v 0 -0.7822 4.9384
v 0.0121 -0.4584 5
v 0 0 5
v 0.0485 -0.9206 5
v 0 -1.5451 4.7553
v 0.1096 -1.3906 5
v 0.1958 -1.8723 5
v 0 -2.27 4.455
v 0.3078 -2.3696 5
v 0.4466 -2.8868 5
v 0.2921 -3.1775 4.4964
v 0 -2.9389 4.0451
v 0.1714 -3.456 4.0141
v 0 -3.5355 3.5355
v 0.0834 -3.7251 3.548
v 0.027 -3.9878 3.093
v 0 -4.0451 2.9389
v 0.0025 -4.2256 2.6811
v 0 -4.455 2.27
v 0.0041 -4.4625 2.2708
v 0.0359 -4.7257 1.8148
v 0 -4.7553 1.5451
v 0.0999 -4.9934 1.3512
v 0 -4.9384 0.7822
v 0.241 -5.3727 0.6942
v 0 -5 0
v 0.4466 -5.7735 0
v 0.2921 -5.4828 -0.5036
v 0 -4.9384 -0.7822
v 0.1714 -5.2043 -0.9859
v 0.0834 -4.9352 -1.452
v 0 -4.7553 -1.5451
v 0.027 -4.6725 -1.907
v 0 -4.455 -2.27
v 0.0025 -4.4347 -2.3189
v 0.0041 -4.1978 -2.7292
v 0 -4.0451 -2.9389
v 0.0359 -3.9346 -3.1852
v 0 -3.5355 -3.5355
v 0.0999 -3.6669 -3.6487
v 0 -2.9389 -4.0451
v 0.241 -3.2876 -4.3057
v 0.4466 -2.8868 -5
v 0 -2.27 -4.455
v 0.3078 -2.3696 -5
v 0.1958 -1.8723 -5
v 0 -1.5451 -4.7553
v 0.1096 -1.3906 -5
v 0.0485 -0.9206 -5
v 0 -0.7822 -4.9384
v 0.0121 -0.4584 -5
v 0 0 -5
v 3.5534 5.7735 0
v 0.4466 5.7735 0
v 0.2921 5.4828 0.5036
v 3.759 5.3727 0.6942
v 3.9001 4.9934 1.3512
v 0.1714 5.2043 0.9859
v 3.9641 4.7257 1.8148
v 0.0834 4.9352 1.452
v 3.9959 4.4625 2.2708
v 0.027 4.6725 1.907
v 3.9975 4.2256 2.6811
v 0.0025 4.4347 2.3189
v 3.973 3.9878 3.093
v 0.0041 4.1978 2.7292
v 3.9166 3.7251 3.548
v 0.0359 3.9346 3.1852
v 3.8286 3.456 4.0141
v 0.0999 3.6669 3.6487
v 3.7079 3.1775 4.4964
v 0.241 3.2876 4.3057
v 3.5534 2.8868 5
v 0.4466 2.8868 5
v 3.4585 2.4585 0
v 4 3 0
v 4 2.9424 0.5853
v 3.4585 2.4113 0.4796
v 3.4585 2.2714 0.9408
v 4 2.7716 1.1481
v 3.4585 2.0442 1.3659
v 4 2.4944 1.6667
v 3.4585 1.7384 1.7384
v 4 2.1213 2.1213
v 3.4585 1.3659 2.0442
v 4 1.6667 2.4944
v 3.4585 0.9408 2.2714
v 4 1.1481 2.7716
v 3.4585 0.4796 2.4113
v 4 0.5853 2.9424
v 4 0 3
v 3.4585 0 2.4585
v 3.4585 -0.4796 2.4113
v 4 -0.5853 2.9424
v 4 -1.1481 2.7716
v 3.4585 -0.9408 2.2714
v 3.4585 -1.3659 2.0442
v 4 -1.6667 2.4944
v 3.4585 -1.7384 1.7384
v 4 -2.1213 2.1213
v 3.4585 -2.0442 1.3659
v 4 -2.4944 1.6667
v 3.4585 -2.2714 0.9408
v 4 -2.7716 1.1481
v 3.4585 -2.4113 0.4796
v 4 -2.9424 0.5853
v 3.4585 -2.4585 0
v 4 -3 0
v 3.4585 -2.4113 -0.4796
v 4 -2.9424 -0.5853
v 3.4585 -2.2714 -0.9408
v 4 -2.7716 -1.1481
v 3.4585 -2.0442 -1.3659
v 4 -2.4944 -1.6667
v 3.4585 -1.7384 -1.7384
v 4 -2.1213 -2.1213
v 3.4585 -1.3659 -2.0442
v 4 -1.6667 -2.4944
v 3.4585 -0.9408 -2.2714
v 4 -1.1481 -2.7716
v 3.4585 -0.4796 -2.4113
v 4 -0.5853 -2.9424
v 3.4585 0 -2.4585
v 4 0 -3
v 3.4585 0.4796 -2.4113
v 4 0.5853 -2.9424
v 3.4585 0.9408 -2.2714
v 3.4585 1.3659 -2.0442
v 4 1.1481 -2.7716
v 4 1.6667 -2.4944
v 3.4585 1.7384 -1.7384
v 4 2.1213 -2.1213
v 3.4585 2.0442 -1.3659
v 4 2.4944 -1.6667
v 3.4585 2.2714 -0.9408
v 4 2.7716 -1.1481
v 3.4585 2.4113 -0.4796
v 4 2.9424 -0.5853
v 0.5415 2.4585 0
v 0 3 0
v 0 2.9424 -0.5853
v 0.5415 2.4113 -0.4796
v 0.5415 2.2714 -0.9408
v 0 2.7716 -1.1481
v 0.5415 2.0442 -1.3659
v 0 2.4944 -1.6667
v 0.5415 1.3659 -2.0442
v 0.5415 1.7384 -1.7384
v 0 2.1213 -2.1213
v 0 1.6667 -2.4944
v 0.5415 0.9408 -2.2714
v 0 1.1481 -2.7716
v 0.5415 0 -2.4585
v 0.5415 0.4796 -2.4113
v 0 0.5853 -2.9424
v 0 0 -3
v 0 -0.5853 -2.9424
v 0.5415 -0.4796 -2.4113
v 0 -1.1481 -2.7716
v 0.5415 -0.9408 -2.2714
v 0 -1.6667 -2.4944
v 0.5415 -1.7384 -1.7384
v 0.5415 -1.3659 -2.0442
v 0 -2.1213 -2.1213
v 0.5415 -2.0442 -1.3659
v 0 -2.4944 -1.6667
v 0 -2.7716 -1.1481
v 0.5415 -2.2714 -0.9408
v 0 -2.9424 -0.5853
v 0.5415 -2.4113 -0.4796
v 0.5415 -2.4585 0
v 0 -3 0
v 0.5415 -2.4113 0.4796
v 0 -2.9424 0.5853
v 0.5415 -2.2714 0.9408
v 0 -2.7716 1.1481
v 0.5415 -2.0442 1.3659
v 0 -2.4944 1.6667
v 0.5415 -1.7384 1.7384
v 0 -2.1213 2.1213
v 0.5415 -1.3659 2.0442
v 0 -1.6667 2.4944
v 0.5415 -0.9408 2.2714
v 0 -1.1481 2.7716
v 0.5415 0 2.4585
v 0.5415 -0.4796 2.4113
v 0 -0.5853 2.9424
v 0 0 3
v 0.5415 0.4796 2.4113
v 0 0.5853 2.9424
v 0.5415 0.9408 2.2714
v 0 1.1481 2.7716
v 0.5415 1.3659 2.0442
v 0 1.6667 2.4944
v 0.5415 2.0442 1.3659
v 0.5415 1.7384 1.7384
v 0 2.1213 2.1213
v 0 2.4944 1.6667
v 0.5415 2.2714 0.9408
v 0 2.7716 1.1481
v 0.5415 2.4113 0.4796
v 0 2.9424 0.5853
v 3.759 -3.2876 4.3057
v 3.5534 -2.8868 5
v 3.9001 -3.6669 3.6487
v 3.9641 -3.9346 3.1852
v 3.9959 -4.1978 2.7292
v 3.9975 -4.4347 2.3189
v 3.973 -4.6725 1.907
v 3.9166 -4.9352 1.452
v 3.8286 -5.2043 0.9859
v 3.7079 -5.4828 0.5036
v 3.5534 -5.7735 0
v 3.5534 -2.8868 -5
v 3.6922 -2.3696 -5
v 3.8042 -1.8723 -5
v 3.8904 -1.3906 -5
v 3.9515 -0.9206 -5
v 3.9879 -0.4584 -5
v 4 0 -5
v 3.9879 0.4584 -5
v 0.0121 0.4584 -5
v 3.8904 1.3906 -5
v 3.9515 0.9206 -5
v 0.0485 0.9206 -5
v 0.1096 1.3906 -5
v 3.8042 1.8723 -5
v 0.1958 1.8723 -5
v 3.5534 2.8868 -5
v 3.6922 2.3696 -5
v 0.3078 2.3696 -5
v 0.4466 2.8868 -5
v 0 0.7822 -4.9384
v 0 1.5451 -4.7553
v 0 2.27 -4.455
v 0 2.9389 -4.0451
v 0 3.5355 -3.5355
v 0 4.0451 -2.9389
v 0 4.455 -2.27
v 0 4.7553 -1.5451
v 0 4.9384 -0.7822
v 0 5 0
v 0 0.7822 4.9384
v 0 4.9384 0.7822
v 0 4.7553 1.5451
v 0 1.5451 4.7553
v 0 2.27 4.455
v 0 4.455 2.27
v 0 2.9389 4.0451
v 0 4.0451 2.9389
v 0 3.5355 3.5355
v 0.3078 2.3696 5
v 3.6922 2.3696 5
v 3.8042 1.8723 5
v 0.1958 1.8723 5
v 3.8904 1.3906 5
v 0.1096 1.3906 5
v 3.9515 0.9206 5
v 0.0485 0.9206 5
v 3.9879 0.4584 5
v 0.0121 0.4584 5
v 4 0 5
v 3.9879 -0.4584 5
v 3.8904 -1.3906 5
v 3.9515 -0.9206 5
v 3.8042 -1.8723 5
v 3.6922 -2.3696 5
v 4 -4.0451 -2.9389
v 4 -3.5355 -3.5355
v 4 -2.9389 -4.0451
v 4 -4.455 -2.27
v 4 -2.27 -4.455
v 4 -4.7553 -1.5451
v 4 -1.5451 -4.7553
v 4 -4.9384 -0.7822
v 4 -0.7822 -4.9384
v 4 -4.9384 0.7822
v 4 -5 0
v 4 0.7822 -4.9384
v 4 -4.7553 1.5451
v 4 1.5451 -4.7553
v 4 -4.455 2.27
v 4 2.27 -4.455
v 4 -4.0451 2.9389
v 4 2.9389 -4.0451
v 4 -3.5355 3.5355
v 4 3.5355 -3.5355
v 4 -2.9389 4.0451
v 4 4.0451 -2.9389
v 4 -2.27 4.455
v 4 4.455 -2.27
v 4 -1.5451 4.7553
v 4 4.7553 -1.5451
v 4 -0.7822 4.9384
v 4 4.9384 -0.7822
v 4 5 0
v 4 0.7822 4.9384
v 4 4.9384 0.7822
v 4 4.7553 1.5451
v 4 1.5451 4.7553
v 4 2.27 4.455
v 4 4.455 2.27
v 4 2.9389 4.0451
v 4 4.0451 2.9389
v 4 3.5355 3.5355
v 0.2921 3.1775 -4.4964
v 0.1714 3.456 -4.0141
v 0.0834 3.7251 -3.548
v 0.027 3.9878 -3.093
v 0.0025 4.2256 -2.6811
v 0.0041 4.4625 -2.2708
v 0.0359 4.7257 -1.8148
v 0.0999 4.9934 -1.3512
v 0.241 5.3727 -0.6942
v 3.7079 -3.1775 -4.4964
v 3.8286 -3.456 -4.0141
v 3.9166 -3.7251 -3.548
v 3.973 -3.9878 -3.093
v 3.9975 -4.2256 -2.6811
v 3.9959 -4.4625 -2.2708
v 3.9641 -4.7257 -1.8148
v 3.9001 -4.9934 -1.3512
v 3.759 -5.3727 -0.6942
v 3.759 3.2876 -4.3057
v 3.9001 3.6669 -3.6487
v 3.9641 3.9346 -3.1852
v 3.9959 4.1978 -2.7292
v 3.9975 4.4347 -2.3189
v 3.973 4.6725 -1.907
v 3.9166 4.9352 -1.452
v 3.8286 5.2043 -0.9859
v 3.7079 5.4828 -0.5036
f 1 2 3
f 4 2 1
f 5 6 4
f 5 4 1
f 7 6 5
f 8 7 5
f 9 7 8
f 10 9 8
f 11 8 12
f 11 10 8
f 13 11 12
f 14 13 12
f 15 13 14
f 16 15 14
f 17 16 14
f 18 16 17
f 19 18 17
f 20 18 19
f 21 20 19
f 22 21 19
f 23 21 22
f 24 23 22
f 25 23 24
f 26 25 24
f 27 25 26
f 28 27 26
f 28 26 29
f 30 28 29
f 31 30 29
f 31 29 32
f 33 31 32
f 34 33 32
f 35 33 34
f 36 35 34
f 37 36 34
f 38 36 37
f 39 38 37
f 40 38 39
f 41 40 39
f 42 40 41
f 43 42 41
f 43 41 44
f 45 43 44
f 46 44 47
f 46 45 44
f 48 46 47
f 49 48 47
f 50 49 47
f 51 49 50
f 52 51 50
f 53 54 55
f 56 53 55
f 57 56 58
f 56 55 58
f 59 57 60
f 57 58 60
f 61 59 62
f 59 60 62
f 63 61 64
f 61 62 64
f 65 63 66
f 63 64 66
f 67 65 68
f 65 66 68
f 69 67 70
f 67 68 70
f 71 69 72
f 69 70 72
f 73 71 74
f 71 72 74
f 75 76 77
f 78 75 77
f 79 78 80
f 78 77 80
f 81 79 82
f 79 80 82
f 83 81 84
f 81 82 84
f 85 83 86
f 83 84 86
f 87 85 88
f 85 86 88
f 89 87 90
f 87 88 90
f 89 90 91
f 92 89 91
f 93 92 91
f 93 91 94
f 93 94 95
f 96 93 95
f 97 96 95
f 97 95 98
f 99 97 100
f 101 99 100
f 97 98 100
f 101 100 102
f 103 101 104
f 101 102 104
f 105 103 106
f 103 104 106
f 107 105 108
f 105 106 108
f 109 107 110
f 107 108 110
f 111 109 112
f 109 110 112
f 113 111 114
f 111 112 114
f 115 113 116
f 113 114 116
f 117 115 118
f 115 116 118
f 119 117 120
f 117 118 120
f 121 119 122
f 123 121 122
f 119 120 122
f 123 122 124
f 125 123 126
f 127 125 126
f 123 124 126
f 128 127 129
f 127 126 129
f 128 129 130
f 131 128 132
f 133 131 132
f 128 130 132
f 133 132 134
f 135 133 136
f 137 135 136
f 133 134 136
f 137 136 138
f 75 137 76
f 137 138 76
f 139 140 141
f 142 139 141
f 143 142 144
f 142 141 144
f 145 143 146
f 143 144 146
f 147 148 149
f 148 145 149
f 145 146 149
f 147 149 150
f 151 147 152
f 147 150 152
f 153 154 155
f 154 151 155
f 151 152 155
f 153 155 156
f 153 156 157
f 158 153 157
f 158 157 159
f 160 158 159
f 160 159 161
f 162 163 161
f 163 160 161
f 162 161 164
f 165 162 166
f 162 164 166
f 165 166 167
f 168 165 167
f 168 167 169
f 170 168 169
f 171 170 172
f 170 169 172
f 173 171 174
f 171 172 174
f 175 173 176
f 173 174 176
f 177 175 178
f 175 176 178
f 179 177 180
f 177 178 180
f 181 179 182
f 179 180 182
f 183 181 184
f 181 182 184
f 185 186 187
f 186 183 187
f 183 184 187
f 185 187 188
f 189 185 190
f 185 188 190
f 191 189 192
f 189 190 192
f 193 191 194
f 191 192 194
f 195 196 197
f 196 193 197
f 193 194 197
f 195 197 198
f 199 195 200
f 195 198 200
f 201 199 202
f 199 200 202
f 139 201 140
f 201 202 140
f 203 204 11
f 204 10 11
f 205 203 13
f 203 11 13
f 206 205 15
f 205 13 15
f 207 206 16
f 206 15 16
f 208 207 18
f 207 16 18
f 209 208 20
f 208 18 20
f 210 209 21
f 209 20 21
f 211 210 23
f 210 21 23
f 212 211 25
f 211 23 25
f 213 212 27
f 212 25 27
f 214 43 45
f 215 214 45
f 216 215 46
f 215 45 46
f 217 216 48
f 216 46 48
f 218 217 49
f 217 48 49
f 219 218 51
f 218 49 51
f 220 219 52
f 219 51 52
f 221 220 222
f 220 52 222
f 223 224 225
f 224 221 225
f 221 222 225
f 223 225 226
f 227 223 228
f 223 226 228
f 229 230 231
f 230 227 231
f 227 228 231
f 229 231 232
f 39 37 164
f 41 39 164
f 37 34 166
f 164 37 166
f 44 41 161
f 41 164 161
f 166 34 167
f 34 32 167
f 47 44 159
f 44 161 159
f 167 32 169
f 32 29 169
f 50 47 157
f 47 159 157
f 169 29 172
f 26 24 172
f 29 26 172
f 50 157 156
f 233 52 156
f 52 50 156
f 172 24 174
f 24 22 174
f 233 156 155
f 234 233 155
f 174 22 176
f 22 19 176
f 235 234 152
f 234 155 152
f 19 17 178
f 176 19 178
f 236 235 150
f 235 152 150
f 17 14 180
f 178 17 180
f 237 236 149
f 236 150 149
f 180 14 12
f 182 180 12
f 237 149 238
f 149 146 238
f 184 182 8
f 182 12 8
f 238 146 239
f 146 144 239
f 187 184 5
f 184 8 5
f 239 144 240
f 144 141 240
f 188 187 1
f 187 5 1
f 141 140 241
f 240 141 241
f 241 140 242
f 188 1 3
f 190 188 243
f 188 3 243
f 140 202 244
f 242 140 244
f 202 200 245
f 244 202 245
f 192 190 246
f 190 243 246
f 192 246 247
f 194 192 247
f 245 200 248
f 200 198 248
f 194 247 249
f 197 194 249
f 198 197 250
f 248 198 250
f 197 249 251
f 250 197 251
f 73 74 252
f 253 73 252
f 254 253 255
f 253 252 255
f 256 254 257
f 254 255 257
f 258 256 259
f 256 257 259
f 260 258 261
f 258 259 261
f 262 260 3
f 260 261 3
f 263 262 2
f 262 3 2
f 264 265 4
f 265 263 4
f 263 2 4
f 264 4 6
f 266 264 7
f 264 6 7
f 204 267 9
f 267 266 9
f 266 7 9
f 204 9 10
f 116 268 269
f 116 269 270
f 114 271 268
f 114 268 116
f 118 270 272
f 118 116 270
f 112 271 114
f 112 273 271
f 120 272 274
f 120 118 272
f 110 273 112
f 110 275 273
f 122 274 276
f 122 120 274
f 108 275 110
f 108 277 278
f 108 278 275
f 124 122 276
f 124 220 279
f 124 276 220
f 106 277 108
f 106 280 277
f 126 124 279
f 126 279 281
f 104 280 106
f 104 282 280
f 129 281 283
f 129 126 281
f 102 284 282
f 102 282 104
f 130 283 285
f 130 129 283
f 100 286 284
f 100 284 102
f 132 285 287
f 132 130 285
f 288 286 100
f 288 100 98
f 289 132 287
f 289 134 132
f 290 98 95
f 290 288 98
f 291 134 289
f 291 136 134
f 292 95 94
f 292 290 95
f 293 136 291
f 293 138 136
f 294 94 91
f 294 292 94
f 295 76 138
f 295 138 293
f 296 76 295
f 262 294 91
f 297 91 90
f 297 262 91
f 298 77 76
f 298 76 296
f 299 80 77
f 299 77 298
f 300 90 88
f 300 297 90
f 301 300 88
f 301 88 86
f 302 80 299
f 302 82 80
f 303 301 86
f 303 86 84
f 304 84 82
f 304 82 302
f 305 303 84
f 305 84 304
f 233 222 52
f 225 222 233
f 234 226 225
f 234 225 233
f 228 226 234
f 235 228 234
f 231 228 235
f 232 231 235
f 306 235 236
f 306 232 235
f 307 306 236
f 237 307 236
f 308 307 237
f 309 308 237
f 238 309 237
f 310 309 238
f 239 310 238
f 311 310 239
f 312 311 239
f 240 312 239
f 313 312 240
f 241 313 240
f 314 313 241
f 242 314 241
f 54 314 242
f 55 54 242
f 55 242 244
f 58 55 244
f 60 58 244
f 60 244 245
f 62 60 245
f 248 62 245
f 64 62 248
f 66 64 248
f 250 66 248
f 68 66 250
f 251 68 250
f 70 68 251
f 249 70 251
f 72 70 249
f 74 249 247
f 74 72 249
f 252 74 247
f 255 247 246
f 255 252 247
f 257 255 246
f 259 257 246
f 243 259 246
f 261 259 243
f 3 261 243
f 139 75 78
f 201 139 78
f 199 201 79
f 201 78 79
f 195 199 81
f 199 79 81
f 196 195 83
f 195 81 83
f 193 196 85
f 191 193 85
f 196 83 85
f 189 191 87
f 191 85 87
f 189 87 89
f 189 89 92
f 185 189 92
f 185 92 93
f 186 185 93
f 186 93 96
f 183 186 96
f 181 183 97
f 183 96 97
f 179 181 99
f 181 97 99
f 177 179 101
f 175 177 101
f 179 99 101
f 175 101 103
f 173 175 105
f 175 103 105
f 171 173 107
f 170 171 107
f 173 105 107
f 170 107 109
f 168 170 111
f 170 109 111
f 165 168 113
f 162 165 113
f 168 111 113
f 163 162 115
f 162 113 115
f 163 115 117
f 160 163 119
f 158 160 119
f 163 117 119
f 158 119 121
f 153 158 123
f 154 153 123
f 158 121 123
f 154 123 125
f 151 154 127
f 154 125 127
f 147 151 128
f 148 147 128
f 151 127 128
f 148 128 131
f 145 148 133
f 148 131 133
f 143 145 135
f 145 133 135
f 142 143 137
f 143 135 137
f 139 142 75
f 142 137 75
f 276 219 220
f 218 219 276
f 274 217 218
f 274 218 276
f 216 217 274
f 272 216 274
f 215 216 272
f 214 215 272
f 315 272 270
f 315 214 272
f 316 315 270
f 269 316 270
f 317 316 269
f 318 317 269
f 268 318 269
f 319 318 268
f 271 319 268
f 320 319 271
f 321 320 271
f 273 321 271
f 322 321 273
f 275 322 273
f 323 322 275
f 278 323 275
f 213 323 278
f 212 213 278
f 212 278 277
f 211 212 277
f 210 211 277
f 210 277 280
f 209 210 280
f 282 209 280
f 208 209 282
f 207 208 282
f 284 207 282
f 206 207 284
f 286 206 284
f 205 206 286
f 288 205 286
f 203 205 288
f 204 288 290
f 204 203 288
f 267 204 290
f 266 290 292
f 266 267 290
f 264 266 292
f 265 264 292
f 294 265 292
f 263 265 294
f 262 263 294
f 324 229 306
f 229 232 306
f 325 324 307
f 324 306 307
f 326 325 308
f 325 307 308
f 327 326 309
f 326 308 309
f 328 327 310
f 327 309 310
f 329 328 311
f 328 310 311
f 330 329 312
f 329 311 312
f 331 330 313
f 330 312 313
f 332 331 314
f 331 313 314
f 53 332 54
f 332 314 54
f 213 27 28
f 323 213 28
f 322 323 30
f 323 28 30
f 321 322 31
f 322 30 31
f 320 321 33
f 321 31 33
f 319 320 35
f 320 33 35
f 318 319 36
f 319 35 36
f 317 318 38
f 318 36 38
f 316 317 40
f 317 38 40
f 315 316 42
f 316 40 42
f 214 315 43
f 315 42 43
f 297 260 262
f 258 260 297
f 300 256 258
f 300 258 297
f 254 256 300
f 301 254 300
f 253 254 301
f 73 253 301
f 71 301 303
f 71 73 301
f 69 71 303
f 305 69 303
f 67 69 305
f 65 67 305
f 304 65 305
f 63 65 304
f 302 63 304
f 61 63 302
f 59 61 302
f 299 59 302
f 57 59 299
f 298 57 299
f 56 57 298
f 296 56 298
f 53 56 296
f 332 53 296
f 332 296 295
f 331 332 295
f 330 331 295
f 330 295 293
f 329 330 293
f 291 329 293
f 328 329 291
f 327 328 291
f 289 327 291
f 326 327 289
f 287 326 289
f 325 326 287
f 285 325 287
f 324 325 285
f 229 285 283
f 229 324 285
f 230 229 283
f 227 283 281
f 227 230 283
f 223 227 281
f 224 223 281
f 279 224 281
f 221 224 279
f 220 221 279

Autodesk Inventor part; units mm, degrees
sketch "Skizze_1" plane through (0, 0, 0) normal (0, 0, 1) x (1, 0, 0)
  line L0 (4, 0) -> (0, 0)
  line L1 (0, 0) -> (0, 5)
  line L2 (0, 5) -> (0.5774, 6)
  line L3 (0.5774, 6) -> (3.4226, 6)
  line L4 (3.4226, 6) -> (4, 5)
  line L5 (4, 5) -> (4, 0)
  line L6 (4, 0) -> (0, 0)
revolve "Revolution1" add sketch "Skizze_1" angle 360 about axis through (4, 0, 0) along (1, 0, 0)
sketch "Skizze_2_ALT_Drilling_1" plane through (0, 0, 0) normal (0, 0, 1) x (1, 0, 0)
  line L0 (4, 0) -> (0, 0)
  line L1 (0, 0) -> (0, 3)
  line L2 (0, 3) -> (0.5415, 2.4585)
  line L3 (0.5415, 2.4585) -> (3.4585, 2.4585)
  line L4 (3.4585, 2.4585) -> (4, 3)
  line L5 (4, 3) -> (4, 0)
  line L6 (4, 0) -> (0, 0)
revolve "Revolution2" cut sketch "Skizze_2_ALT_Drilling_1" angle 360 about axis through (4, 0, 0) along (1, 0, 0)
thread "Thread1" size "M6x1" class "6H" standard "ISO Metric profile" full length
sketch "Skizze_3" plane through (0, 0, 0) normal (1, 0, 0) x (0, 1, 0)
  line L0 (-10, 10) -> (-10, -10)
  line L1 (-10, -10) -> (10, -10)
  line L2 (10, -10) -> (10, 10)
  line L3 (10, 10) -> (-10, 10)
  line L4 (-2.8868, 5) -> (-5.7735, 0)
  line L5 (-5.7735, 0) -> (-2.8868, -5)
  line L6 (-2.8868, -5) -> (2.8868, -5)
  line L7 (2.8868, -5) -> (5.7735, 0)
  line L8 (5.7735, 0) -> (2.8868, 5)
  line L9 (2.8868, 5) -> (-2.8868, 5)
extrude "Extrusion1" cut sketch "Skizze_3" along normal blind 4
ref_plane "DADO1_XY" through (0, 0, 0) normal (1, 0, 0) x (0, 0, -1)
ref_plane "DADO1_YZ" through (0, 0, 0) normal (0, 0, -1) x (0, 1, 0)
ref_plane "DADO1_ZX" through (0, 0, 0) normal (0, 1, 0) x (1, 0, 0)
properties part number "U-12-16"
